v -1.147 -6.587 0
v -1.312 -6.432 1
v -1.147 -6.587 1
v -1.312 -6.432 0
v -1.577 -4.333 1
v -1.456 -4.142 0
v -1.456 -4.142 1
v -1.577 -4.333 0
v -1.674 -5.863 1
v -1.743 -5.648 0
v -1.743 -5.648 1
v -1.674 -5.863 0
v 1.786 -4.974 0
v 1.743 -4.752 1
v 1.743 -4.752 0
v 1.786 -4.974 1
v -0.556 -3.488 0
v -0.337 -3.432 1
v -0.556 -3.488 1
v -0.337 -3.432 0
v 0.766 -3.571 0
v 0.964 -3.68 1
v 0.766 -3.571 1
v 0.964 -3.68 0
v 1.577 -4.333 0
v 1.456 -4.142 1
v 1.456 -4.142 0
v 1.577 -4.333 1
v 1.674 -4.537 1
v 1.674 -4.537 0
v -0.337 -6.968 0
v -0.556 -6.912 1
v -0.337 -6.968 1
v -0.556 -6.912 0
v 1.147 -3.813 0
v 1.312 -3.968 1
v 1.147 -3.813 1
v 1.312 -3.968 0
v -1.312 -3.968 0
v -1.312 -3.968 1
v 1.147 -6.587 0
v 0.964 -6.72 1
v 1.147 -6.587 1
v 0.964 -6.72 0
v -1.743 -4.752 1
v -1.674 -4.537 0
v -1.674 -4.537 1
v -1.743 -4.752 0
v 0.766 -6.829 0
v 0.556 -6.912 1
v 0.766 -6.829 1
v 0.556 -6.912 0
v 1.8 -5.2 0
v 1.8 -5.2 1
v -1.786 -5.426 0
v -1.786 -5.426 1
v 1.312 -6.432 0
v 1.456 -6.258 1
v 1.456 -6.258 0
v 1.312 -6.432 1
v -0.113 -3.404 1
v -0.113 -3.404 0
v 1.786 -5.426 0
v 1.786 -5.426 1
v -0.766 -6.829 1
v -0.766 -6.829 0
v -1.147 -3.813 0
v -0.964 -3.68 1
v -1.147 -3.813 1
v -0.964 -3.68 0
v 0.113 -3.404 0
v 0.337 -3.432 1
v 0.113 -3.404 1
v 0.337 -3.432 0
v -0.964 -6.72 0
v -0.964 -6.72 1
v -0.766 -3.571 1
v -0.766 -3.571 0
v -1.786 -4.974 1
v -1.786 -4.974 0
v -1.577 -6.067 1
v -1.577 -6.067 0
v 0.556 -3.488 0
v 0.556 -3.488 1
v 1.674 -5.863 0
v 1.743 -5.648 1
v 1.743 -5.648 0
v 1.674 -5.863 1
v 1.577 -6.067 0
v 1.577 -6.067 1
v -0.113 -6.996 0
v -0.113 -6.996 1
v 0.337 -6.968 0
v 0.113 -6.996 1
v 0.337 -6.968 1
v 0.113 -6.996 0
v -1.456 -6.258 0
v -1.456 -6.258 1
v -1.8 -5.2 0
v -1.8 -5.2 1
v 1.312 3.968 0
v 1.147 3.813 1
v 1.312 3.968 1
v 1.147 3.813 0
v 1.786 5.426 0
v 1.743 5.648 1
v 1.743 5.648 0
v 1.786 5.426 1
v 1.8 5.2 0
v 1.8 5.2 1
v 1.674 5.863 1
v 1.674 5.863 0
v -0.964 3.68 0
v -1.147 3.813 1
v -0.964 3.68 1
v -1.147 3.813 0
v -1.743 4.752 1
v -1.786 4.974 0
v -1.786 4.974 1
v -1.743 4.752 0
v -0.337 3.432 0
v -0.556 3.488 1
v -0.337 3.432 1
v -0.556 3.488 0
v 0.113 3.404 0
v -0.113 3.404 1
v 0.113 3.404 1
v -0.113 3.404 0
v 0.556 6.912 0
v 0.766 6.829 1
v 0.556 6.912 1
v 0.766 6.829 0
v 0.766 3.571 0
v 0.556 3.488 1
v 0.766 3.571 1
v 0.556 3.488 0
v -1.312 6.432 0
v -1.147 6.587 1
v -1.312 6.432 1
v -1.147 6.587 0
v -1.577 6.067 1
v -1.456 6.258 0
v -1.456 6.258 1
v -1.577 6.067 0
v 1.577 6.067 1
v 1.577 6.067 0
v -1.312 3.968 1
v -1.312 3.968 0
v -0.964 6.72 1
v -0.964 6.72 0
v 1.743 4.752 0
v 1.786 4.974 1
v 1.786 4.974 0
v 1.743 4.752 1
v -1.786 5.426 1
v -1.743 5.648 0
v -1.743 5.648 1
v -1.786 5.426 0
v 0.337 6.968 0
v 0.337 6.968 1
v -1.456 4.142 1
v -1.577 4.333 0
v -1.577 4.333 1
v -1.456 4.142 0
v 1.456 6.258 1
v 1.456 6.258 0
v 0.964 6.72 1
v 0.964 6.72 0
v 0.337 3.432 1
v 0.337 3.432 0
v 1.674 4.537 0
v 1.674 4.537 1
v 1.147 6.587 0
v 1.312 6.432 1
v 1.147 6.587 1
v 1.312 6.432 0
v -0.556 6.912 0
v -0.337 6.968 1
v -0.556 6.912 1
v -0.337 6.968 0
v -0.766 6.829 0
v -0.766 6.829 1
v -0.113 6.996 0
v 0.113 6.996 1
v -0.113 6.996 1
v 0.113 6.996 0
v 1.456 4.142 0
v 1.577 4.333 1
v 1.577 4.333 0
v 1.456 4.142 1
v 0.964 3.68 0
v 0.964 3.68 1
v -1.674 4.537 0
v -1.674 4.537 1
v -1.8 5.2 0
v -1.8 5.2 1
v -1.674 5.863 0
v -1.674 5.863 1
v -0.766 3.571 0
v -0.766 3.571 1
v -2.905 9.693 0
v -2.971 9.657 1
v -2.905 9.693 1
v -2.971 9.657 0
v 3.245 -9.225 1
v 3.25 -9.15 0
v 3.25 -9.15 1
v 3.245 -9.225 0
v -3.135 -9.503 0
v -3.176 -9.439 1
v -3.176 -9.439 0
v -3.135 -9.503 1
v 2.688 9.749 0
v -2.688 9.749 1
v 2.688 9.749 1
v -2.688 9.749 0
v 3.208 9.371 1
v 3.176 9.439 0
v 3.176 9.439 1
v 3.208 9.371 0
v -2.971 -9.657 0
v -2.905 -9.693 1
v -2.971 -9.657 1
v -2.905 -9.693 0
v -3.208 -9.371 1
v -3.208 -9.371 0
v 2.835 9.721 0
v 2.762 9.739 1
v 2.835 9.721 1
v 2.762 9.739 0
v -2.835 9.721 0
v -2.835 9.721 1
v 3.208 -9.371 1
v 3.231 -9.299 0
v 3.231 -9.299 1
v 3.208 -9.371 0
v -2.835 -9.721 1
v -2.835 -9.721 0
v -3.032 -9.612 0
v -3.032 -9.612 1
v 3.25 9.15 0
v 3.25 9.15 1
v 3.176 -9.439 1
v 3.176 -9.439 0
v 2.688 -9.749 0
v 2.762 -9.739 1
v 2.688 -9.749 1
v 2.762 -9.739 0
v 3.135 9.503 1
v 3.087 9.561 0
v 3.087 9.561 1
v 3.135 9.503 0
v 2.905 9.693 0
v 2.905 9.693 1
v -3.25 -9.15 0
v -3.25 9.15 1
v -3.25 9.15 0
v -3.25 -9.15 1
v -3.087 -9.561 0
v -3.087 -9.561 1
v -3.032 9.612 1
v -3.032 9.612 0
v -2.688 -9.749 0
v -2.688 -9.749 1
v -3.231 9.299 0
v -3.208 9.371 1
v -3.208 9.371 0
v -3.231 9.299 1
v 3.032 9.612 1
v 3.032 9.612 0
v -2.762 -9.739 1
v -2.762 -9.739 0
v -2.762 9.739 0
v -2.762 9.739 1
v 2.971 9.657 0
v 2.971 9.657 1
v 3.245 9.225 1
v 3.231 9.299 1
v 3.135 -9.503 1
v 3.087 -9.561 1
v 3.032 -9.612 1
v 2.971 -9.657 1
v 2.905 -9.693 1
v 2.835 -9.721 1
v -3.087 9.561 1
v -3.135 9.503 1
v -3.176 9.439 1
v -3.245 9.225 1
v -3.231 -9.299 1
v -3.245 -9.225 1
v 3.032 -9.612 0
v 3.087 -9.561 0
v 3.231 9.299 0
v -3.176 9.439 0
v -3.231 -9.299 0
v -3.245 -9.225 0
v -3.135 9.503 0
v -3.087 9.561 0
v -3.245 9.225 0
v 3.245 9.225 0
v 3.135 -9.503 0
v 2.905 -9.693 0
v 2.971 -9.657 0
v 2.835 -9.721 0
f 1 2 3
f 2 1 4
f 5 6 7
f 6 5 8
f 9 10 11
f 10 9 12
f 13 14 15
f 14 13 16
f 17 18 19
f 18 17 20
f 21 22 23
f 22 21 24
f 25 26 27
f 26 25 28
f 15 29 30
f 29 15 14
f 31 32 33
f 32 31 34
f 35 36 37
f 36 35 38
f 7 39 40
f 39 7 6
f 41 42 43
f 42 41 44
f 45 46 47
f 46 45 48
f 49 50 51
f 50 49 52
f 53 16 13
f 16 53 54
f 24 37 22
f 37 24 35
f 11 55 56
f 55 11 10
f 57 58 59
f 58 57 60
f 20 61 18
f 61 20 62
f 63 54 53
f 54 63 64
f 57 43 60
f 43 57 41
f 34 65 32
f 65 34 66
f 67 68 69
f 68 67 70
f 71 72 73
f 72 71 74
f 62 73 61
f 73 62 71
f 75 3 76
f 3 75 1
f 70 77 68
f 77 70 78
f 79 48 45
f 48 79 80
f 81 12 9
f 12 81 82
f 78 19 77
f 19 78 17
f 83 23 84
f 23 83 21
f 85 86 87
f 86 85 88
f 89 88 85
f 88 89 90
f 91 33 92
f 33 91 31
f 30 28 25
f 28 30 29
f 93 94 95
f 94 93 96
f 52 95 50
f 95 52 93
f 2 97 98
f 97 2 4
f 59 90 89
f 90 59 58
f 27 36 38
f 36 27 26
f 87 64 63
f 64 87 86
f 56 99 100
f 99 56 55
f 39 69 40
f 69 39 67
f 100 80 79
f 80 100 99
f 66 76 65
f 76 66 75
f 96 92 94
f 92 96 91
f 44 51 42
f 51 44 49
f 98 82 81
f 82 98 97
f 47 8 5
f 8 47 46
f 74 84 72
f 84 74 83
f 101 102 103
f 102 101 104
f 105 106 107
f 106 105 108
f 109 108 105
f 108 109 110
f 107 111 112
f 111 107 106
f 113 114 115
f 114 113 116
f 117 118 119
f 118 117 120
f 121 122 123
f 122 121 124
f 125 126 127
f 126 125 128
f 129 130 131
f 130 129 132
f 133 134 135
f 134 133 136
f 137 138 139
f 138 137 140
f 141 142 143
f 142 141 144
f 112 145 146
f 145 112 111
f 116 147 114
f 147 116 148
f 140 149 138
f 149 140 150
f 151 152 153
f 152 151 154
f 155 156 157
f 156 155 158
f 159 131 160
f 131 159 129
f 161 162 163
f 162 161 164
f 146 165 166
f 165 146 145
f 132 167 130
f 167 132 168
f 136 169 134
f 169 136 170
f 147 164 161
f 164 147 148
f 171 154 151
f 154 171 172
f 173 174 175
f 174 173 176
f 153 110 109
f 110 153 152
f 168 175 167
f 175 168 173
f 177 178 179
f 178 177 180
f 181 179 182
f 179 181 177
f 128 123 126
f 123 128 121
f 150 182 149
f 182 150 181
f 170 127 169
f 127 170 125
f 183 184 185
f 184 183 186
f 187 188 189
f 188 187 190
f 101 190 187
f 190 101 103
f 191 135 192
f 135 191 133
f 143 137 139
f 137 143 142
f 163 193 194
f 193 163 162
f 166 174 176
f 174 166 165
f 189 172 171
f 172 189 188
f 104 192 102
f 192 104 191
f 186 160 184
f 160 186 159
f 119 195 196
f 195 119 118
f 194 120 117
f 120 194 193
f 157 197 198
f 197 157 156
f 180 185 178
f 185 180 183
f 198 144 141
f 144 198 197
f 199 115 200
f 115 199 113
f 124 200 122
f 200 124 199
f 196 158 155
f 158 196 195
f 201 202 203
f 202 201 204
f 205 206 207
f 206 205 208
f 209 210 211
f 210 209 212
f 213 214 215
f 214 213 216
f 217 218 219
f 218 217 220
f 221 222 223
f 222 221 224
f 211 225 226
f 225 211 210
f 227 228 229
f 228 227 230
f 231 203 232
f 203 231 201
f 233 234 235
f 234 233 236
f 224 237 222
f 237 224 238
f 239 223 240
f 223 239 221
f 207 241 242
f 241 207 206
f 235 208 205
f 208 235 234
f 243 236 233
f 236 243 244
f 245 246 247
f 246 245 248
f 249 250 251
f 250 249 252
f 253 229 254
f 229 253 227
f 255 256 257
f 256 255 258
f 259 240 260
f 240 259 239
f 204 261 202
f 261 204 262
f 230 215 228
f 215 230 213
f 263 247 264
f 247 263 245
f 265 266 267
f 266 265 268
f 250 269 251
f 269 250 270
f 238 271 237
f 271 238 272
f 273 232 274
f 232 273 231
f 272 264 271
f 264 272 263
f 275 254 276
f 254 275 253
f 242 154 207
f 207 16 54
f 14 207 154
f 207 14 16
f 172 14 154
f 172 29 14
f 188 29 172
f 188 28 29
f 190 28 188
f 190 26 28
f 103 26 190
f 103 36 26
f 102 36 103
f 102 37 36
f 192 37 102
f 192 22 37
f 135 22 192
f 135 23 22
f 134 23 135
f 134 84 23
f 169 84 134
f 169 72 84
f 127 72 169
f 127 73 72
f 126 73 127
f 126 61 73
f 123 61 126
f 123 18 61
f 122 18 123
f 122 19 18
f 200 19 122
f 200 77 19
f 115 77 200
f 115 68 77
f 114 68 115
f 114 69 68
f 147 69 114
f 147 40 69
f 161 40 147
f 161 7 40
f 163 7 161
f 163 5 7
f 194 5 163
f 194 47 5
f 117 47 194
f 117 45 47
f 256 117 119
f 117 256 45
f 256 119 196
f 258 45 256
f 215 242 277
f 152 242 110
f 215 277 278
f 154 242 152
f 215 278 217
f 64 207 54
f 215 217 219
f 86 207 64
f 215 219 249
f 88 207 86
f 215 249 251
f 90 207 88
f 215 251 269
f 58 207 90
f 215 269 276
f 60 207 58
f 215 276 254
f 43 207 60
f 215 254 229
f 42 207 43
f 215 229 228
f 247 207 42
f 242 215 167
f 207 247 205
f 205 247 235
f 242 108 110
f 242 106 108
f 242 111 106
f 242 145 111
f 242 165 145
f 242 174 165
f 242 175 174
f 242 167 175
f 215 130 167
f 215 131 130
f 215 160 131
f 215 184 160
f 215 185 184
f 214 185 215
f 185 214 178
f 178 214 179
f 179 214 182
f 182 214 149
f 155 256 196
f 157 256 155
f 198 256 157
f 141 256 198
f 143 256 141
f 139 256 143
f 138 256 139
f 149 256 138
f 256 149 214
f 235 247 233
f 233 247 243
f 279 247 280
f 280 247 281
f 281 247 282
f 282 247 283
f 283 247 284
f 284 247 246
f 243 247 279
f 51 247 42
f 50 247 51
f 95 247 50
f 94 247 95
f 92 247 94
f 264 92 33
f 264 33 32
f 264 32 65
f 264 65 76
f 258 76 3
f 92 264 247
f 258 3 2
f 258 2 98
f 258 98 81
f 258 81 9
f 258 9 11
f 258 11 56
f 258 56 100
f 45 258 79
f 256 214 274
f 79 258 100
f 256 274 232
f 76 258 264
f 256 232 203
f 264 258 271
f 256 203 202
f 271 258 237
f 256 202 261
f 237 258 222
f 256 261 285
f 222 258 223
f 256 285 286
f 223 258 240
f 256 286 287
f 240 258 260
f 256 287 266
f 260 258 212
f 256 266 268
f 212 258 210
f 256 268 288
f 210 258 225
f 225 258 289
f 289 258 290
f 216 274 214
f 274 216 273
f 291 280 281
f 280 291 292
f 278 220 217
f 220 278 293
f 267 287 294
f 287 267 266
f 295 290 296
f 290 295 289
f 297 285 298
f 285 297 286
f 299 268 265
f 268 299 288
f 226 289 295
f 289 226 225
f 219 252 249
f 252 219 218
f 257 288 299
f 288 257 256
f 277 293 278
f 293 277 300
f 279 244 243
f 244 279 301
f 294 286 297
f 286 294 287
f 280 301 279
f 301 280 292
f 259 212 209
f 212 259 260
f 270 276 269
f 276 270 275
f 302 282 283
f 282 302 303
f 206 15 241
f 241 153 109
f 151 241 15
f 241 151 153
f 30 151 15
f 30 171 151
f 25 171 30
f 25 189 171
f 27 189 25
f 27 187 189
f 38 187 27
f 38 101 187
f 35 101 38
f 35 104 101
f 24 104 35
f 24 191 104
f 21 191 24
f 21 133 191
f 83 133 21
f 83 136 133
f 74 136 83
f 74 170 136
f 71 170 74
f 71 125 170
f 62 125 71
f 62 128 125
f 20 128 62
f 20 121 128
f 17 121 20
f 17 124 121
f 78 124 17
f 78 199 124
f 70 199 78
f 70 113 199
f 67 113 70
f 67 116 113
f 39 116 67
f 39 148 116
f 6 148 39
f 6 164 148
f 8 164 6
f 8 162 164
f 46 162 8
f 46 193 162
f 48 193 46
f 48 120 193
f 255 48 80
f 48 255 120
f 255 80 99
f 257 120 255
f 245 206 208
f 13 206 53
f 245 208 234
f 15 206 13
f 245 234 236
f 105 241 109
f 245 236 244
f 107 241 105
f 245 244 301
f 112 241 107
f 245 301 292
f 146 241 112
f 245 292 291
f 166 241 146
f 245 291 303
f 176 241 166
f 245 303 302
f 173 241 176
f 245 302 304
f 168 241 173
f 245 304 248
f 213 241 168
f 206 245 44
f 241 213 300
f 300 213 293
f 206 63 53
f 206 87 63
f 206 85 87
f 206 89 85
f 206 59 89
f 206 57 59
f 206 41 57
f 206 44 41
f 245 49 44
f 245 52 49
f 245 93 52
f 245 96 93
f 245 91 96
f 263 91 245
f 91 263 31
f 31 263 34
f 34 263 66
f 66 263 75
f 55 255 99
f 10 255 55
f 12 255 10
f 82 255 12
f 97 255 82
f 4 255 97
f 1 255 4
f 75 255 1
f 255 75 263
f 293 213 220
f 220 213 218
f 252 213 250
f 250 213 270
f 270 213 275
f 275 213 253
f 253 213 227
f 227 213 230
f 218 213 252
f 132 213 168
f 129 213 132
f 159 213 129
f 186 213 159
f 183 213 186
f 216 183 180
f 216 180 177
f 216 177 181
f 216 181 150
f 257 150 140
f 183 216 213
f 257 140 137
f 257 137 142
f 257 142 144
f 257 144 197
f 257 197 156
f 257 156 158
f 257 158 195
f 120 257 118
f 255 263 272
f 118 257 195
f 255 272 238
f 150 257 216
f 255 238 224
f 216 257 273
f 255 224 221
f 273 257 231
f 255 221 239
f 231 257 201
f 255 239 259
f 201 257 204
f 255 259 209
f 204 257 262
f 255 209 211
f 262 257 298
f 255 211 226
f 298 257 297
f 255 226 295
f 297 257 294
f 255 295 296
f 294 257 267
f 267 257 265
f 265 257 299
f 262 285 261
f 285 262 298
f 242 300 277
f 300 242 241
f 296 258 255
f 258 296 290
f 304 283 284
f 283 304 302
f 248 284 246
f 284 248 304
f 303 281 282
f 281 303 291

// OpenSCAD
$fn = 50;

difference() {
	union() {
		translate(v = [34.5, 0, 1]) {
			rotate(a = [0, 0, 0]) {
				difference() {
					union() {
						translate(v = [-34.5, 0, -1]) {
							hull() {
								translate(v = [-2.65, 9.15, 0]) {
									cylinder(h = 1, r = 0.6);
								}
								translate(v = [2.65, 9.15, 0]) {
									cylinder(h = 1, r = 0.6);
								}
								translate(v = [-2.65, -9.15, 0]) {
									cylinder(h = 1, r = 0.6);
								}
								translate(v = [2.65, -9.15, 0]) {
									cylinder(h = 1, r = 0.6);
								}
							}
						}
					}
					union() {
						translate(v = [-34.5, -5.2, -2]) {
							cylinder(h = 3, r = 1.8);
						}
						translate(v = [-34.5, 5.2, -2]) {
							cylinder(h = 3, r = 1.8);
						}
					}
				}
			}
		}
	}
	union();
}
